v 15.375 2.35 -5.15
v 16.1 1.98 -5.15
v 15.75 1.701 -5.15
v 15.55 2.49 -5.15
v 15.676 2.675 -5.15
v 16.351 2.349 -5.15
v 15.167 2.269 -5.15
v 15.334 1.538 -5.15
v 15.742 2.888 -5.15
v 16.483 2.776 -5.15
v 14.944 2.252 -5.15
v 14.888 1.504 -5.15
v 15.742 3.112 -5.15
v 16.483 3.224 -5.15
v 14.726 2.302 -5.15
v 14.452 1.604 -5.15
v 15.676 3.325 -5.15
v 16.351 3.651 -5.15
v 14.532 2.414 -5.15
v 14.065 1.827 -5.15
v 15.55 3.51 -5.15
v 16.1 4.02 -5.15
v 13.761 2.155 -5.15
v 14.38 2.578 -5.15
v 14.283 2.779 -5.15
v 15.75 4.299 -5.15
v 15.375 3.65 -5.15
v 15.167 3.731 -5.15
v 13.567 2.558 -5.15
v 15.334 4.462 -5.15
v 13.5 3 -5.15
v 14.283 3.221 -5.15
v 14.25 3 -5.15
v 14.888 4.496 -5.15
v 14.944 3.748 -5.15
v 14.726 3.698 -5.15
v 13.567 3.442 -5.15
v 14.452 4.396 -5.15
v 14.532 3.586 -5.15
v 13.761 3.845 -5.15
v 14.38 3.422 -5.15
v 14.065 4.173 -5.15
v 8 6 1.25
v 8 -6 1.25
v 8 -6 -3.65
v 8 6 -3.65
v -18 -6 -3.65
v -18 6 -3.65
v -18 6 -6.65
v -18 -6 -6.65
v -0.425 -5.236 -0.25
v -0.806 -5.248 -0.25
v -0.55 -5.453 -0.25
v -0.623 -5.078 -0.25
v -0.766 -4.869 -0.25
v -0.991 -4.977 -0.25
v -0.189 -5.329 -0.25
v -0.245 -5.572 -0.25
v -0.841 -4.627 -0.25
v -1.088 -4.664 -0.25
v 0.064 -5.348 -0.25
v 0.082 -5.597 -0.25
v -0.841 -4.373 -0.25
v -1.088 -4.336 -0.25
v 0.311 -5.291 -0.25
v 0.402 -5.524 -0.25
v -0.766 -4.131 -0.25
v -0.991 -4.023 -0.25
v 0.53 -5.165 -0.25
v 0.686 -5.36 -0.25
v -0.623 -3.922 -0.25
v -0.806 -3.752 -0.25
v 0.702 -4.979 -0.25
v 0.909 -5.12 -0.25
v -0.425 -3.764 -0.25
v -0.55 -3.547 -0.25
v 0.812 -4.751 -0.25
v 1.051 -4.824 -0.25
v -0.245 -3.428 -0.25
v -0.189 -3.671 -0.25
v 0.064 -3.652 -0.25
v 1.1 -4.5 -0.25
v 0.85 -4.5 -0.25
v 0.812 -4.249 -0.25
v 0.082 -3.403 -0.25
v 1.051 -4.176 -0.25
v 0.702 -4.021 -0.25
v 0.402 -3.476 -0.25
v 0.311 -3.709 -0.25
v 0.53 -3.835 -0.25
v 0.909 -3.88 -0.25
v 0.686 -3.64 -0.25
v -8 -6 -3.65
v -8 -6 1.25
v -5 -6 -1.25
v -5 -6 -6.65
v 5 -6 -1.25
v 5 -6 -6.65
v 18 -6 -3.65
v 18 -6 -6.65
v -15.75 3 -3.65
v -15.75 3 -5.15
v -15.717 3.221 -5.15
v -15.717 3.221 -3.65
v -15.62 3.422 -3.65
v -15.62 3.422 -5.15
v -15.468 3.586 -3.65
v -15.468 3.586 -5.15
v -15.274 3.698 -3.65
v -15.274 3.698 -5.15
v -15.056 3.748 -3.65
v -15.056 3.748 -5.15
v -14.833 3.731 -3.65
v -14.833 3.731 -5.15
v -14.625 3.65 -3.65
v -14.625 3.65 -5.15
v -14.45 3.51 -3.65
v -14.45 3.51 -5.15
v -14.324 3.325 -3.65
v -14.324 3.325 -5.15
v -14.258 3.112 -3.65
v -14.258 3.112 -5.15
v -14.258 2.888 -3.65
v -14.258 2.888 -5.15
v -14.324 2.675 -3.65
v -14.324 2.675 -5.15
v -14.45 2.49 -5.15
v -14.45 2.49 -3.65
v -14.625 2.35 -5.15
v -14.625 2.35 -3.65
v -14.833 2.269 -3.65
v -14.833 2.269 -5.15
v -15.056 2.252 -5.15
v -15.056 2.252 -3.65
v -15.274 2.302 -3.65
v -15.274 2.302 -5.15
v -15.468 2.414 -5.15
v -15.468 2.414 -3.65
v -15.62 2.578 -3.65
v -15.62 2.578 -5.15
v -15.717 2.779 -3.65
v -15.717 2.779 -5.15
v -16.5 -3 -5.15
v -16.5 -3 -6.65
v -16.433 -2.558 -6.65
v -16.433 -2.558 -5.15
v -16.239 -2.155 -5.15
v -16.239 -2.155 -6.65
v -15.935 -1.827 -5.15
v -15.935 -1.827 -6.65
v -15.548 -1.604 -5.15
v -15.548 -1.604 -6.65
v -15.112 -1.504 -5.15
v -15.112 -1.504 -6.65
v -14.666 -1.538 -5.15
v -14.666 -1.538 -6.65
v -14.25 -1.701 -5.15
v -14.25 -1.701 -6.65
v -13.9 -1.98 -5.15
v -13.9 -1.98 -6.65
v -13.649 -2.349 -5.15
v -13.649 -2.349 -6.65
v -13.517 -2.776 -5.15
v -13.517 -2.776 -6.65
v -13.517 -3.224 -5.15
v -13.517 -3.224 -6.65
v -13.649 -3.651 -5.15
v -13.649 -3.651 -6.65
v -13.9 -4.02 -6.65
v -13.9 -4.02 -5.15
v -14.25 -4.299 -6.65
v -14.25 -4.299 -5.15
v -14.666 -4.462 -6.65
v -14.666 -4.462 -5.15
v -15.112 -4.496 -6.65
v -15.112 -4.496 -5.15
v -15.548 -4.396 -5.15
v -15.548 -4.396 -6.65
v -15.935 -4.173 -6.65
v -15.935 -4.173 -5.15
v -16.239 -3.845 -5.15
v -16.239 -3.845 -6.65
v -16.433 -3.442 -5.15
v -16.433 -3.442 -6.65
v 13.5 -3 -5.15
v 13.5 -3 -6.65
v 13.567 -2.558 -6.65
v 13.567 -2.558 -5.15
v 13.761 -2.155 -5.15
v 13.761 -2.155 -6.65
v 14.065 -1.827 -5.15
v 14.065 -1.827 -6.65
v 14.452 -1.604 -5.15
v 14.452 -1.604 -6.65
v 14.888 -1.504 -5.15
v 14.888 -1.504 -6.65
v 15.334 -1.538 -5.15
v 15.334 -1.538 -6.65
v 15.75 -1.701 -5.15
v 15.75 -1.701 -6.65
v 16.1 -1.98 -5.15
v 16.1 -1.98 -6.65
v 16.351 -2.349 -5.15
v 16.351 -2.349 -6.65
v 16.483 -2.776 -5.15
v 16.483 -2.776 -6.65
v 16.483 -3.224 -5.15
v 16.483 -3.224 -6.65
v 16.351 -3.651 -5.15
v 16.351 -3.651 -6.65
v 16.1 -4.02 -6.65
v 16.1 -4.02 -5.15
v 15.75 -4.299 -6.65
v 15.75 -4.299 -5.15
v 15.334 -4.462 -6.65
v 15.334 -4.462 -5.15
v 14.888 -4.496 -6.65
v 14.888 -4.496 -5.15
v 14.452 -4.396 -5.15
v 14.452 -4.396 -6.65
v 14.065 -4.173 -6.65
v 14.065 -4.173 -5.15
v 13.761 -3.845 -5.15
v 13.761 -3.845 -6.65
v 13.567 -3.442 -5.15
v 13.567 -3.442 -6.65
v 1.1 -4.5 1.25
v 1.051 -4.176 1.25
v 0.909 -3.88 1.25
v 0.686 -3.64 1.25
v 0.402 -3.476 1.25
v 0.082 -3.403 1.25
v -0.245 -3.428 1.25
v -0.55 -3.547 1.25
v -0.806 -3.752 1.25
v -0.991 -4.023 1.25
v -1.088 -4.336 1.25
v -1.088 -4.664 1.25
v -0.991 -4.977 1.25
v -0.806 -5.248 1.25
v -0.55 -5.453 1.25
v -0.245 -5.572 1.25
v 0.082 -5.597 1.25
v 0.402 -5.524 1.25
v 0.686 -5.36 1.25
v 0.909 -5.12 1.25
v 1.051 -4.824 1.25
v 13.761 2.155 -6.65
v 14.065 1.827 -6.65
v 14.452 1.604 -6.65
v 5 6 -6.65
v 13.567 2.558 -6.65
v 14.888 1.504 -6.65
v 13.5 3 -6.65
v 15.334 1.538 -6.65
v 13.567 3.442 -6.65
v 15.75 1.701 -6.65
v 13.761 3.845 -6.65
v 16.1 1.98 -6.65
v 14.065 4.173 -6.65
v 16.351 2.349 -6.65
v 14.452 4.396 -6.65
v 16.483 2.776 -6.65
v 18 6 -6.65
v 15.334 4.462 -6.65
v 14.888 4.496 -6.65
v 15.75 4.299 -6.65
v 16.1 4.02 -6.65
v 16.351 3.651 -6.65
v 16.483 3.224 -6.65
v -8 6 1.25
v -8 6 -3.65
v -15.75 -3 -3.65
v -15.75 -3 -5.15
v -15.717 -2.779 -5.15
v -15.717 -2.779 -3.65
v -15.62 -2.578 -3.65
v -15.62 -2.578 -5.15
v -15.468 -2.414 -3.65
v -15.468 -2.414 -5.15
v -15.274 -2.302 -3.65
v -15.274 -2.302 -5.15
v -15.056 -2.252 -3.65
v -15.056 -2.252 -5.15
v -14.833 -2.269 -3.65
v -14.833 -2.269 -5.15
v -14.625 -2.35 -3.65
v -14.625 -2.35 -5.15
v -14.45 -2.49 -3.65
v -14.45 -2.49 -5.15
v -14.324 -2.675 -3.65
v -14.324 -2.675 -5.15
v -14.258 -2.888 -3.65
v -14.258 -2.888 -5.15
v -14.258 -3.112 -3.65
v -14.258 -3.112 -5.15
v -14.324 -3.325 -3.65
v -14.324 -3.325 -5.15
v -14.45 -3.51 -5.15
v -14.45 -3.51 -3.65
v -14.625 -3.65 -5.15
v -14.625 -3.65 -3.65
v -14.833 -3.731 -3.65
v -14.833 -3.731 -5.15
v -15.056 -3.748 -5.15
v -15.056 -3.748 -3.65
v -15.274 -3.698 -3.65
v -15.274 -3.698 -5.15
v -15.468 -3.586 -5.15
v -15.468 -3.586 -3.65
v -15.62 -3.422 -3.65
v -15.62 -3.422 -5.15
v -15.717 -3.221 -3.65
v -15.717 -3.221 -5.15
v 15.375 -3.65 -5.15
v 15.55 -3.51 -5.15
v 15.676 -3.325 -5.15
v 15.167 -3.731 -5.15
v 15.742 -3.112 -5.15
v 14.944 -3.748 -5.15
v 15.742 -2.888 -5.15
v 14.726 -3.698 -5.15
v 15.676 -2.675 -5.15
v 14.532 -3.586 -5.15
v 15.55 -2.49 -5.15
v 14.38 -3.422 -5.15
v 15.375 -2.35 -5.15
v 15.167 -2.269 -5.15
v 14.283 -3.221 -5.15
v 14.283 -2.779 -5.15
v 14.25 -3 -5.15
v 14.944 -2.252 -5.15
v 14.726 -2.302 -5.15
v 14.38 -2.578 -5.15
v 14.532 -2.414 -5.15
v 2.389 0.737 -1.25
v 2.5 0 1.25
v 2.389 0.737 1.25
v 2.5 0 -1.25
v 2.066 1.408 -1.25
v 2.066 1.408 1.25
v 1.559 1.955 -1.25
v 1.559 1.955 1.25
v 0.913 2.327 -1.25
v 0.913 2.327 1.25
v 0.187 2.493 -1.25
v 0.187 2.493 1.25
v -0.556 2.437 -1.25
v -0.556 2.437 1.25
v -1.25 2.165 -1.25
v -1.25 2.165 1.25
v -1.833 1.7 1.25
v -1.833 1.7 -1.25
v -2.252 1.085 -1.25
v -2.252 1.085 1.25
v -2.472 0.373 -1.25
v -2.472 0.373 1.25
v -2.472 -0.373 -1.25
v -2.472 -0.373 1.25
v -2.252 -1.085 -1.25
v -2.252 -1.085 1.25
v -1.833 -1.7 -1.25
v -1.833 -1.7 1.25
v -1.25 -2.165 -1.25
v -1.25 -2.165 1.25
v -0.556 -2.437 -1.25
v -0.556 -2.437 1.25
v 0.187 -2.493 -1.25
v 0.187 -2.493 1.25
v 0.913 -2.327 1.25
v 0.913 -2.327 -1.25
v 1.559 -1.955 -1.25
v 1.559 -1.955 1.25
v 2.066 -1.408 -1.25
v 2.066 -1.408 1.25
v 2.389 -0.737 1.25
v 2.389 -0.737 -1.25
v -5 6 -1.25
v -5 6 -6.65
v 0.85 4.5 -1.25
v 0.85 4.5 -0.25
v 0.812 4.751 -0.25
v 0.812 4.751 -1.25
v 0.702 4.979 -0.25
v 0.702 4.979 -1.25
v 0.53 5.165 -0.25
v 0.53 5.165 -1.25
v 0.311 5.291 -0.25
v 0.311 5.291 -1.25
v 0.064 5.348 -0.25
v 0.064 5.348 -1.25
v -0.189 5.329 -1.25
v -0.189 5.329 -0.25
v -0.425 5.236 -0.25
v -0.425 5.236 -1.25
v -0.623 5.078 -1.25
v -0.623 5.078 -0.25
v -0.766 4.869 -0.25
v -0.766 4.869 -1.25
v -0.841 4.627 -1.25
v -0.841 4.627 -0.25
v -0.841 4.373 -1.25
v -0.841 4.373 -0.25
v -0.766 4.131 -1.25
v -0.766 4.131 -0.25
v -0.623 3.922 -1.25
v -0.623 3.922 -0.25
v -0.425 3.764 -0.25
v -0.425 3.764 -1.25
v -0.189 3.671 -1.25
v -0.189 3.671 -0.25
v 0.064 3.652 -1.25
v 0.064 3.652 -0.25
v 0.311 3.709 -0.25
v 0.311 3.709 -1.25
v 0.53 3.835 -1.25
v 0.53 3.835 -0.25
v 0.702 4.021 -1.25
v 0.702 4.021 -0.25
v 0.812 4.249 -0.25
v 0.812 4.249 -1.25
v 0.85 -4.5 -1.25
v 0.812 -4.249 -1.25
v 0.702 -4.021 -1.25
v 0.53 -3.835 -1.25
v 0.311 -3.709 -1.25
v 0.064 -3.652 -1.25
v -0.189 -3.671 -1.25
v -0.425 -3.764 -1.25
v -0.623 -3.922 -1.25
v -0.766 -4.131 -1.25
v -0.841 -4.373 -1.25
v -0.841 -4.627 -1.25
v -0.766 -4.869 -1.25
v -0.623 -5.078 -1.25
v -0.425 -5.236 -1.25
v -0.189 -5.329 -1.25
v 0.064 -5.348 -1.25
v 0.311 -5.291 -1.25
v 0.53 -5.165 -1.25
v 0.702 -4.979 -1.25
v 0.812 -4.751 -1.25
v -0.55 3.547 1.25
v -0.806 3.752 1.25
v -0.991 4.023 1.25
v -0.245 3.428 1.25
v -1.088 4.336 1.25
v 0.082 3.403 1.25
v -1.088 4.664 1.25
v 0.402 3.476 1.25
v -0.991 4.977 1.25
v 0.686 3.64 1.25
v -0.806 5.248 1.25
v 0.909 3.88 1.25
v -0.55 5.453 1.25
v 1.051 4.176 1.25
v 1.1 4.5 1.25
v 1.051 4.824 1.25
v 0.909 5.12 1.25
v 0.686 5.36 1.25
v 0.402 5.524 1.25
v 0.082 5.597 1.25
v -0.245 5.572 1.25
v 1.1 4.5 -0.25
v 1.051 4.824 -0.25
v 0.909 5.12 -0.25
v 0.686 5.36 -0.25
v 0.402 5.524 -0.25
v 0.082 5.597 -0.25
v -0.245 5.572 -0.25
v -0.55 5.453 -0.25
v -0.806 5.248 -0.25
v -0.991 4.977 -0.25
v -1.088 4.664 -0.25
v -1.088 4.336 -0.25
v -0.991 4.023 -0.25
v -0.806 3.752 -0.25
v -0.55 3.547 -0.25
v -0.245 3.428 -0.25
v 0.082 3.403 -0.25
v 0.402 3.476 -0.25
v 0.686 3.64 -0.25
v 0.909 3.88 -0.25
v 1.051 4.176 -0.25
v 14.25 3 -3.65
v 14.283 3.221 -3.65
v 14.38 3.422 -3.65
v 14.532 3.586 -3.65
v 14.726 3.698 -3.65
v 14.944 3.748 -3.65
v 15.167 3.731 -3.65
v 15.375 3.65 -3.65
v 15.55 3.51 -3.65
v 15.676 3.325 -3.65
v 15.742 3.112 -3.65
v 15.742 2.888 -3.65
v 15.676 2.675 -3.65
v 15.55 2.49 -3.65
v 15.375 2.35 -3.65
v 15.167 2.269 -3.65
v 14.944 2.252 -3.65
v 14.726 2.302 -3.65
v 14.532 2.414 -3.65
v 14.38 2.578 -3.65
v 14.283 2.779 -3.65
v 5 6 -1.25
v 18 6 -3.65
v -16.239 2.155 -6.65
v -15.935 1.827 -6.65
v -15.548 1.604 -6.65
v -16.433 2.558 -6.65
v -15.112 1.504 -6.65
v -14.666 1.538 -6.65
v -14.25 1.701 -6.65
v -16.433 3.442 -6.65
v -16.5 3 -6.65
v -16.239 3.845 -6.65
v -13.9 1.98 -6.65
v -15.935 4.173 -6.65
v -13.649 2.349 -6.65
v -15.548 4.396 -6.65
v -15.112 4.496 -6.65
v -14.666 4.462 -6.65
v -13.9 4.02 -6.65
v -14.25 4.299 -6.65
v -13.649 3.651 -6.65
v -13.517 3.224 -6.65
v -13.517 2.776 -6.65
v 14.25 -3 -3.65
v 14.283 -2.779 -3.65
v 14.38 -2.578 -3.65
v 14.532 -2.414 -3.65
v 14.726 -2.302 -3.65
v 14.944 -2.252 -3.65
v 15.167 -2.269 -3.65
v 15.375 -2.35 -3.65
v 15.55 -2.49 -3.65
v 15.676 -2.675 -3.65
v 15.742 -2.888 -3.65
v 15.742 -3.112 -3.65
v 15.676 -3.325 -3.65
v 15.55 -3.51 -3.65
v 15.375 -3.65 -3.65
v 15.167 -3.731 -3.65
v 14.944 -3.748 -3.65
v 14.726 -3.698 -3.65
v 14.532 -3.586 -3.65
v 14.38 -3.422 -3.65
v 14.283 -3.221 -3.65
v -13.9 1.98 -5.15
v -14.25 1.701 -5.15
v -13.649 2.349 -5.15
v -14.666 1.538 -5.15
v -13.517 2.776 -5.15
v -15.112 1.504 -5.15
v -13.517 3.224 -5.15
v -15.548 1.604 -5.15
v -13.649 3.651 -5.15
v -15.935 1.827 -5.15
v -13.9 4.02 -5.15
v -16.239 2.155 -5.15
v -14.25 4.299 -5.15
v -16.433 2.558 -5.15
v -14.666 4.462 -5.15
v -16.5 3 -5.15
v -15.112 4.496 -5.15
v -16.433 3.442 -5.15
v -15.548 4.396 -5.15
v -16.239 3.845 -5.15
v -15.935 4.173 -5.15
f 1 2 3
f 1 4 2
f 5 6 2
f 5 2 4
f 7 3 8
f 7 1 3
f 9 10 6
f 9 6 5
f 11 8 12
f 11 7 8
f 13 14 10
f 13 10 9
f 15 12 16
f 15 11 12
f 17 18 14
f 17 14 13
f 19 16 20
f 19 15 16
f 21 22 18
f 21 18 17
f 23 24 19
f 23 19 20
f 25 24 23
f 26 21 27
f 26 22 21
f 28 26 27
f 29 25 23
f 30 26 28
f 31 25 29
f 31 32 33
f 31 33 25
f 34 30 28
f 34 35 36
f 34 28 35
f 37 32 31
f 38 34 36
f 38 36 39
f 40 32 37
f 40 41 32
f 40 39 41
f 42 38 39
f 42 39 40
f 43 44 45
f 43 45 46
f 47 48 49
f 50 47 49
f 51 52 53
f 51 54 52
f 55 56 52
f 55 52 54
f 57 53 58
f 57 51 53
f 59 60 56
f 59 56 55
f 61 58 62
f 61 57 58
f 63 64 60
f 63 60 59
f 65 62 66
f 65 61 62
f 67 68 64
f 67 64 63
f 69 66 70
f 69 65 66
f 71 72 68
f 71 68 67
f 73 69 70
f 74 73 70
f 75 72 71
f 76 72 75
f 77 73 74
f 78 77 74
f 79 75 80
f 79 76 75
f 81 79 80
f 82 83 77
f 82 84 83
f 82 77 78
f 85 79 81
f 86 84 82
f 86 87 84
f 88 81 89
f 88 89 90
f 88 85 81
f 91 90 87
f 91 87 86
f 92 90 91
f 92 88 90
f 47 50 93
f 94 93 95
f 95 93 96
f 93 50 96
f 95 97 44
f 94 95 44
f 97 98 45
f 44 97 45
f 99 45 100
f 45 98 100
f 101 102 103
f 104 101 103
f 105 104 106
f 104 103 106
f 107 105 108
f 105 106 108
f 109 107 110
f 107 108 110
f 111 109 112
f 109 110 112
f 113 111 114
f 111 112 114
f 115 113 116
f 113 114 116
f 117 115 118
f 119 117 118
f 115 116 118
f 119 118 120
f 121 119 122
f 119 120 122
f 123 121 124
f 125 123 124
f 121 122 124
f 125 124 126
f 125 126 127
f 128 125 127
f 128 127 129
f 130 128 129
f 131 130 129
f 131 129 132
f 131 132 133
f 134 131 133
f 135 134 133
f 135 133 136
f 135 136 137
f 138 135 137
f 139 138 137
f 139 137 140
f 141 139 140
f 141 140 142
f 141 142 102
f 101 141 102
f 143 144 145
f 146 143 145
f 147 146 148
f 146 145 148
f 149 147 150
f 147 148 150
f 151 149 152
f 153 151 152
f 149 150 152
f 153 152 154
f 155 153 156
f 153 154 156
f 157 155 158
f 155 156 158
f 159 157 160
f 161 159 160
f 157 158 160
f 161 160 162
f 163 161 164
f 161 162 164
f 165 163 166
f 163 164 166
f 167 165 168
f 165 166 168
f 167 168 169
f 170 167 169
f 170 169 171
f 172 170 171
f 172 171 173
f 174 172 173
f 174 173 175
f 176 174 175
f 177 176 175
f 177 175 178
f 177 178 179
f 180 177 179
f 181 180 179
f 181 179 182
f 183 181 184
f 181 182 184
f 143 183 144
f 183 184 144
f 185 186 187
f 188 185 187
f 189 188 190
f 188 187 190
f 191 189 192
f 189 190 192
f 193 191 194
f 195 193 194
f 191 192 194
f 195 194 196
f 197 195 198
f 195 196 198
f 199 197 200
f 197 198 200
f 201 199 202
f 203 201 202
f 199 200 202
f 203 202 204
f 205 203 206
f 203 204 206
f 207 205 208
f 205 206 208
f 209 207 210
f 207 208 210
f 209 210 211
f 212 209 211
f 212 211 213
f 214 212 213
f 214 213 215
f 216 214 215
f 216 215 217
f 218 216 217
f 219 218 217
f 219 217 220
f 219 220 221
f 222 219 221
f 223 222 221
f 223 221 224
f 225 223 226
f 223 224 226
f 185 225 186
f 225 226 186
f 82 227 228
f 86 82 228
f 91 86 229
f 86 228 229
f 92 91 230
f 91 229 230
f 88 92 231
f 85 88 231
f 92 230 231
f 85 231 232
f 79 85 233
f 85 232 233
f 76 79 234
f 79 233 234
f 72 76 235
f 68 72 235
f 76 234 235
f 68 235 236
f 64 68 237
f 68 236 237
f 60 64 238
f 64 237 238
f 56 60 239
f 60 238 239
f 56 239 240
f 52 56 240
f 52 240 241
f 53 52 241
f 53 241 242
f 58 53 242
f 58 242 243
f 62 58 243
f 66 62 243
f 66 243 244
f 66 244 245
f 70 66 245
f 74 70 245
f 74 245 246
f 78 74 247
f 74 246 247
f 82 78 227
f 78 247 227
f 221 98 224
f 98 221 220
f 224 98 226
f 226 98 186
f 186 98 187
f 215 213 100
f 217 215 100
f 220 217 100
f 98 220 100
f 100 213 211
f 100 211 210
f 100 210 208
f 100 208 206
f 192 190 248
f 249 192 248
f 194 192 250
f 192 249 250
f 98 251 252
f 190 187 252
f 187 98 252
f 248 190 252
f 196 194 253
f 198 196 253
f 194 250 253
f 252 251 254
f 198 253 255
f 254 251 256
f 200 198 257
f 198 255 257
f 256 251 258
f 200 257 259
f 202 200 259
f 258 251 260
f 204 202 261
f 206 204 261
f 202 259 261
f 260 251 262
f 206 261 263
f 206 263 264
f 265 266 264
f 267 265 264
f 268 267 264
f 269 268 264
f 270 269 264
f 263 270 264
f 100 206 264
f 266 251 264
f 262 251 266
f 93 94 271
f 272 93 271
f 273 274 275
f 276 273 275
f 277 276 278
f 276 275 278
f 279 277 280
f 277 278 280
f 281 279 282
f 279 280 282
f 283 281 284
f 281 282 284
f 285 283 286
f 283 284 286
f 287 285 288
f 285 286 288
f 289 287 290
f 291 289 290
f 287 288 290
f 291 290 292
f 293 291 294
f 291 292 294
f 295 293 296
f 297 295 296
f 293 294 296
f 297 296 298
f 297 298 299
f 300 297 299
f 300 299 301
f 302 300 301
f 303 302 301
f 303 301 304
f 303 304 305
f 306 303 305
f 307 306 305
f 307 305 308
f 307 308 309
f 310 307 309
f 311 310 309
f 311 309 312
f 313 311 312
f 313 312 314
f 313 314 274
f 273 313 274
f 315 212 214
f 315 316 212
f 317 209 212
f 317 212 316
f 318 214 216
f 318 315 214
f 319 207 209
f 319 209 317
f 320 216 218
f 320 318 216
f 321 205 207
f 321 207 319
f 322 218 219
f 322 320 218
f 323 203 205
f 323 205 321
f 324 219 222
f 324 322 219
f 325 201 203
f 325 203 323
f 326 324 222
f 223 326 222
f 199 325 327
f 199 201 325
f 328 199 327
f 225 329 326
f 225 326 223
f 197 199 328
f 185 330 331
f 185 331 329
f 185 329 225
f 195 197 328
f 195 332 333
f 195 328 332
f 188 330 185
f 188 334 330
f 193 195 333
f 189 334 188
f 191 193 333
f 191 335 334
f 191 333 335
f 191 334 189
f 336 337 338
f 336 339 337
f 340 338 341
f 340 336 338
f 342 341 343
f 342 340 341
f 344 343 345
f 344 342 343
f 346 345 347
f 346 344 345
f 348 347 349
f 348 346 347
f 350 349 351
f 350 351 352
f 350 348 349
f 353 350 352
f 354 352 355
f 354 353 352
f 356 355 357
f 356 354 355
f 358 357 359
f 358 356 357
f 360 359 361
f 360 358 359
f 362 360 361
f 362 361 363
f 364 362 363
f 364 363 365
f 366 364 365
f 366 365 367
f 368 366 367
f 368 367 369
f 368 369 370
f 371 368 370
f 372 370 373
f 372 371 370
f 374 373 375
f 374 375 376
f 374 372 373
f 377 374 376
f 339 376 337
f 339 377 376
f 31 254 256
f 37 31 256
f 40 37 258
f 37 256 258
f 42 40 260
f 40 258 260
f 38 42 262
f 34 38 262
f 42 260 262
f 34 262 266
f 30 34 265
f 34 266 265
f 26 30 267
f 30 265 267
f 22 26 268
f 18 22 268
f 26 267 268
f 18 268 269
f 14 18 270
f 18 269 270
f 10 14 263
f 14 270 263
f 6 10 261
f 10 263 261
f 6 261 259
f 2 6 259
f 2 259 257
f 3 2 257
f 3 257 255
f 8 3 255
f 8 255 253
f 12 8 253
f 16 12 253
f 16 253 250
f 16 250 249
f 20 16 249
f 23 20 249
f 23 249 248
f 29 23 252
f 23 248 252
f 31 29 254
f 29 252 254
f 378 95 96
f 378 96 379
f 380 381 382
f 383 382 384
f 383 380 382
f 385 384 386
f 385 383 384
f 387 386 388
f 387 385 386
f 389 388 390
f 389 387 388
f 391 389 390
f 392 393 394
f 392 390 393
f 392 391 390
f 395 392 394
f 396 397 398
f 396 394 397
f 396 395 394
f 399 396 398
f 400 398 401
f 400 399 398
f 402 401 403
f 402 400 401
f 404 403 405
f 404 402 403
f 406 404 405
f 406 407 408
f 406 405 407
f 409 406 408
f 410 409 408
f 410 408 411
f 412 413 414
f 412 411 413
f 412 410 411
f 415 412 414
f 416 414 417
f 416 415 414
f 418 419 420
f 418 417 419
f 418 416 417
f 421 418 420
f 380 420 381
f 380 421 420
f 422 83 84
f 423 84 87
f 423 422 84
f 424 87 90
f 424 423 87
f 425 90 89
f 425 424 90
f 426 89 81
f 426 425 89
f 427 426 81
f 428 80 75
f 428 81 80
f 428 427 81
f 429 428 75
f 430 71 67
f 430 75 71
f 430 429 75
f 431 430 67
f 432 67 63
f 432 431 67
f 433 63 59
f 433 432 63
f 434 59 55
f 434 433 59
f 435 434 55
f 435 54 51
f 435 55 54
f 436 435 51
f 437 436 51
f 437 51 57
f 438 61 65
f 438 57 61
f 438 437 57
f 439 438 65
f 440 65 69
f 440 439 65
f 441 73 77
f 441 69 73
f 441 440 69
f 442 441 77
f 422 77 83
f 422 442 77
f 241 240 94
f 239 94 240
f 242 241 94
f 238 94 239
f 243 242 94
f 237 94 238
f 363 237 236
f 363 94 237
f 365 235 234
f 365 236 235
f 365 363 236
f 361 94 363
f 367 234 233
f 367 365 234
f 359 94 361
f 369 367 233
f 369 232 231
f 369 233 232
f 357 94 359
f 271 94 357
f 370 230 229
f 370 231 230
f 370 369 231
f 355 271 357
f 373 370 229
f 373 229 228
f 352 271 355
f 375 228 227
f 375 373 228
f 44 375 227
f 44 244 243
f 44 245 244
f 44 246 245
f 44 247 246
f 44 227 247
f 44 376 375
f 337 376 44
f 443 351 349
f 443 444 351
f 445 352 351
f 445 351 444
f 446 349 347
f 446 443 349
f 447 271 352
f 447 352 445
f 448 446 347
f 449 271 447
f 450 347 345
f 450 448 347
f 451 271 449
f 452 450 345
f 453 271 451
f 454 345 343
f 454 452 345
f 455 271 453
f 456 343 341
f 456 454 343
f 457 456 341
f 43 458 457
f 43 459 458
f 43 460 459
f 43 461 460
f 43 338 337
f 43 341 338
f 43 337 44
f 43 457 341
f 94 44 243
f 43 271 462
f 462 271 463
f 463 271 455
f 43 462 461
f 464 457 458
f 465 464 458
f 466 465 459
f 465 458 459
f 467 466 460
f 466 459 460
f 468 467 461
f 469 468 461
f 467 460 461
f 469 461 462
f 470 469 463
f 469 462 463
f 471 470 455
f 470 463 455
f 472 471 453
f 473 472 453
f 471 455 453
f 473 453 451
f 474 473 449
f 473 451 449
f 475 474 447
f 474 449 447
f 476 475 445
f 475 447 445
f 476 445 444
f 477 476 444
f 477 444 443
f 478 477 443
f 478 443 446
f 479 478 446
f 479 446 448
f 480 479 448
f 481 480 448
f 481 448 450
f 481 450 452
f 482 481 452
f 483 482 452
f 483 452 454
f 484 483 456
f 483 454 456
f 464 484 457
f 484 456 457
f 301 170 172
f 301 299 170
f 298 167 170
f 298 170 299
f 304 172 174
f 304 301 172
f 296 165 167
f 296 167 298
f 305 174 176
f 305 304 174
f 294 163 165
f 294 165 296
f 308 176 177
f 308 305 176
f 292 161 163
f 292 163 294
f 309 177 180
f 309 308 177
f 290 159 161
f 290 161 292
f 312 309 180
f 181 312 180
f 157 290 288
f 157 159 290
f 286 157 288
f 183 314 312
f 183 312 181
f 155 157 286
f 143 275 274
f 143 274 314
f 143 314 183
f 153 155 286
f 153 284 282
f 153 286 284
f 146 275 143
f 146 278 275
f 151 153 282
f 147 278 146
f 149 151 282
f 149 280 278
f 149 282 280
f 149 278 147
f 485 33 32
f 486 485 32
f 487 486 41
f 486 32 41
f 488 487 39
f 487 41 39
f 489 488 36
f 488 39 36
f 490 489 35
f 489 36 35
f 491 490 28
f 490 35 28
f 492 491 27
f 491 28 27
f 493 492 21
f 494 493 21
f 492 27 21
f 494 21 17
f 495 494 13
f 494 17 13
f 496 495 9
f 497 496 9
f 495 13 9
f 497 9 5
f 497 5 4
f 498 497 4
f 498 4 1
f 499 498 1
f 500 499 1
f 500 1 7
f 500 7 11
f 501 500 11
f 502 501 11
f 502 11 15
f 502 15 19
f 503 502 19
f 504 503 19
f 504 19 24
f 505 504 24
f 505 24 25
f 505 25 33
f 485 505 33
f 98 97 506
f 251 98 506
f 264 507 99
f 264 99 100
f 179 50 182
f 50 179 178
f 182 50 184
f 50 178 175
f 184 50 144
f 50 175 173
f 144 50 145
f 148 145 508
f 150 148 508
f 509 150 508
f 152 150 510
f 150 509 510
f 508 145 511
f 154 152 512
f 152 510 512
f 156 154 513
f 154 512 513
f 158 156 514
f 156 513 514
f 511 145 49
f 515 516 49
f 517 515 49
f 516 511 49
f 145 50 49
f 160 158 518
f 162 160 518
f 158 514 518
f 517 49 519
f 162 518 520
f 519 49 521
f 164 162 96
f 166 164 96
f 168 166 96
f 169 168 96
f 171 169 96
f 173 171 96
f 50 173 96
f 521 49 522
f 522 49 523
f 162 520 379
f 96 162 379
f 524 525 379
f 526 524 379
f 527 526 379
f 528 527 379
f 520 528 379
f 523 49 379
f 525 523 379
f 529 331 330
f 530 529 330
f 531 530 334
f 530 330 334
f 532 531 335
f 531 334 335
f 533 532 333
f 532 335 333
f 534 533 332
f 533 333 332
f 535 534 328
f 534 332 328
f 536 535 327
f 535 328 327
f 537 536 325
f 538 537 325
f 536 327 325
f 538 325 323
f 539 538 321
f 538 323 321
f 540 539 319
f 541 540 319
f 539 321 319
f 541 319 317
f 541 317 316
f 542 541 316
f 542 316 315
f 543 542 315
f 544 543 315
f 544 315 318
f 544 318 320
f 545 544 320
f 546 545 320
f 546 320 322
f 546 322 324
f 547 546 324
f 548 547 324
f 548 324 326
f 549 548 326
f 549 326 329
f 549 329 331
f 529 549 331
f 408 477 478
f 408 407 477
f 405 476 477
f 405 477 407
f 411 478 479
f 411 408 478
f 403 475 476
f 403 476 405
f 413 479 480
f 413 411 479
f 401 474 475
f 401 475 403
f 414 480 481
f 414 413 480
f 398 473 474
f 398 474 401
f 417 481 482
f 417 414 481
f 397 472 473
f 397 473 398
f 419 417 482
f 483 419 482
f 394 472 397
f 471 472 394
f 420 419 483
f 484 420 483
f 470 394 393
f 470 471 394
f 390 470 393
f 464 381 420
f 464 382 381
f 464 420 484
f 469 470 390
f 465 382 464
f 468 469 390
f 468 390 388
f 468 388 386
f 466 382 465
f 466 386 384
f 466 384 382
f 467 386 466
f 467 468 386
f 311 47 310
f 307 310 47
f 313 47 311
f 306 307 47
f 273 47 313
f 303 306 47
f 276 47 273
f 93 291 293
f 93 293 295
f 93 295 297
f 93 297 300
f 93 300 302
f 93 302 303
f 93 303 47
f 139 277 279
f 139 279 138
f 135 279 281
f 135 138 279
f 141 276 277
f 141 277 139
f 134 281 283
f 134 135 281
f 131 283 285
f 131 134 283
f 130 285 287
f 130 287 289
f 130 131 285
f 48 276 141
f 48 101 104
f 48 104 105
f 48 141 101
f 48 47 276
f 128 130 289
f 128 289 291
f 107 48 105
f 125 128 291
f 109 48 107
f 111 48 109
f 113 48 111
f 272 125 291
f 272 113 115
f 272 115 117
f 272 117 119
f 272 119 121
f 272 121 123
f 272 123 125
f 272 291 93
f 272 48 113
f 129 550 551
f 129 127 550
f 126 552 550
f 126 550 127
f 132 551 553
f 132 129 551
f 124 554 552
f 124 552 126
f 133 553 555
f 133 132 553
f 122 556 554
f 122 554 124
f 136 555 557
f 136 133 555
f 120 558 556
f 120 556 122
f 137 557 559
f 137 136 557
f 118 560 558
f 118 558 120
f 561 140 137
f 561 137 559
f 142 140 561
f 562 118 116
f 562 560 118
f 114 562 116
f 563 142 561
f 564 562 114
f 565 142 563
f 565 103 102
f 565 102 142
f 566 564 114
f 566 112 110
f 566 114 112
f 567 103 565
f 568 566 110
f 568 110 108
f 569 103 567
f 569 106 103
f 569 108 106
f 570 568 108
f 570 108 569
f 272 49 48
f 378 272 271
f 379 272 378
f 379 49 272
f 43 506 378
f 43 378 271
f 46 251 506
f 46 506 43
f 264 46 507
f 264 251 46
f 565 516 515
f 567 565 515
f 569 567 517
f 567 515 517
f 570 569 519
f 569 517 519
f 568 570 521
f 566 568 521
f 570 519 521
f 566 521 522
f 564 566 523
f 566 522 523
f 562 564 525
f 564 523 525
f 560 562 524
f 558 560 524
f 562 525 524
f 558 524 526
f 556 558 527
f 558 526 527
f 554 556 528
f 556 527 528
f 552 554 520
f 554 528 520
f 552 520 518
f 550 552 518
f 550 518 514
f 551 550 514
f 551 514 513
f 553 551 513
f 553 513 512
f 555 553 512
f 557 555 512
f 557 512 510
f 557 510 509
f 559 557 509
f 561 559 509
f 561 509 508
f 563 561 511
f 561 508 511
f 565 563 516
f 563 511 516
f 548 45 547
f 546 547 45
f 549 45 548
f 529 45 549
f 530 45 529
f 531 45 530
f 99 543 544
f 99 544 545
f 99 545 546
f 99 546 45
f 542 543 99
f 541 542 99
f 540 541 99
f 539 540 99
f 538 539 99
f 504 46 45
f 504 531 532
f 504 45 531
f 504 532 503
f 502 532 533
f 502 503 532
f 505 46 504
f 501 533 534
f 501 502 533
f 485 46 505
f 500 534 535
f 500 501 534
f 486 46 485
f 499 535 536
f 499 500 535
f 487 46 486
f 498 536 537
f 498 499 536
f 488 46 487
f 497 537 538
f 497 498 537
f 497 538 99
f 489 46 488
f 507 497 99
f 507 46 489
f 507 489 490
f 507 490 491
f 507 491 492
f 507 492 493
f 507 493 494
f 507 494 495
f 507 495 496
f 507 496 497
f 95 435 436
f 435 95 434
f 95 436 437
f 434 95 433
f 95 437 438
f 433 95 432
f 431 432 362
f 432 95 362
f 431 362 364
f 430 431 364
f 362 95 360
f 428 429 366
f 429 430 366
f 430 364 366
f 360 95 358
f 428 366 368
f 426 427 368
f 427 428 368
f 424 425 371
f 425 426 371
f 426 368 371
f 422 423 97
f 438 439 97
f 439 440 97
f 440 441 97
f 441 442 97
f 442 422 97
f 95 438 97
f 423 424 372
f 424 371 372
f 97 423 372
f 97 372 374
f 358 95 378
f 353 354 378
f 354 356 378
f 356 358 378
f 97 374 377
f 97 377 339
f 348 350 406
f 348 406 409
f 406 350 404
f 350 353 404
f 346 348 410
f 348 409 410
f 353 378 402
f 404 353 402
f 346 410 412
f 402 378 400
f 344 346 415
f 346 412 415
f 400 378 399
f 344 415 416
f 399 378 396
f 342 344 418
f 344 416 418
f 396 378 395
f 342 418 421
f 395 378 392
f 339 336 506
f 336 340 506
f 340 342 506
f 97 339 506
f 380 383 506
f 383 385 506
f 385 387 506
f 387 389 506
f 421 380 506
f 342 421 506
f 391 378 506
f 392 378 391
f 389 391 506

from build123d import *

# Parameters (mm, degrees)
SKETCH_1_W          = 10
SKETCH_1_H          = 12
SKETCH_1_R          = 0.85
SKETCH_1_R_2        = 2.5
EXTRUDE_1_DEPTH     = 1.25
CUT_EXTRUDE_START   = 1.25
SKETCH_1_6_R        = 1.1
CUT_EXTRUDE_1_DEPTH = 1.5
SKETCH_2_W          = 3
SKETCH_2_H          = 12
EXTRUDE_2_DEPTH     = 7.9
SKETCH_3_W          = 10
SKETCH_3_H          = 3
EXTRUDE_3_DEPTH     = 12
SKETCH_4_R          = 0.75
CUT_EXTRUDE_2_DEPTH = 21.552615405
SKETCH_4_3_R        = 1.5
CUT_EXTRUDE_3_DEPTH = 1.5


with BuildPart() as part:
    # 草图1 → 凸台-拉伸1 (new, symmetric)
    with BuildSketch(Plane.XY):
        Rectangle(SKETCH_1_W, SKETCH_1_H)
        with Locations((0, 4.5)):
            Circle(SKETCH_1_R, mode=Mode.SUBTRACT)
        with Locations((0, -4.5)):
            Circle(SKETCH_1_R, mode=Mode.SUBTRACT)
        Circle(SKETCH_1_R_2, mode=Mode.SUBTRACT)
    extrude(amount=EXTRUDE_1_DEPTH, both=True)

    # 草图1<6> → 切除-拉伸1 (cut)
    with BuildSketch(Plane.XY.offset(CUT_EXTRUDE_START)):
        with Locations((0, 4.5)):
            Circle(SKETCH_1_6_R)
        with Locations((0, -4.5)):
            Circle(SKETCH_1_6_R)
    extrude(amount=-CUT_EXTRUDE_1_DEPTH, mode=Mode.SUBTRACT)

    # 草图2 → 凸台-拉伸2 (add)
    with BuildSketch(Plane.XY.offset(1.25)):
        with Locations((6.5, 0)):
            Rectangle(SKETCH_2_W, SKETCH_2_H)
        with Locations((-6.5, 0)):
            Rectangle(SKETCH_2_W, SKETCH_2_H)
    extrude(amount=-EXTRUDE_2_DEPTH)

    # 草图3 → 凸台-拉伸3 (add)
    with BuildSketch(Plane(origin=(0, 6, 0), x_dir=(1, 0, 0), z_dir=(0, 1, 0))):
        with Locations((-13, 5.15)):
            Rectangle(SKETCH_3_W, SKETCH_3_H)
        with Locations((13, 5.15)):
            Rectangle(SKETCH_3_W, SKETCH_3_H)
    extrude(amount=-EXTRUDE_3_DEPTH)

    # 草图4 → 切除-拉伸2 (cut, through all)
    with BuildSketch(Plane(origin=(0, 0, -6.65), x_dir=(-1, 0, 0), z_dir=(0, 0, -1))):
        with Locations((15, -3)):
            Circle(SKETCH_4_R)
        with Locations((15, 3)):
            Circle(SKETCH_4_R)
        with Locations((-15, -3)):
            Circle(SKETCH_4_R)
        with Locations((-15, 3)):
            Circle(SKETCH_4_R)
    extrude(amount=-CUT_EXTRUDE_2_DEPTH, mode=Mode.SUBTRACT)

    # 草图4<3> → 切除-拉伸3 (cut)
    with BuildSketch(Plane(origin=(0, 0, -6.65), x_dir=(-1, 0, 0), z_dir=(0, 0, -1))):
        with Locations((15, 3)):
            Circle(SKETCH_4_3_R)
        with Locations((15, -3)):
            Circle(SKETCH_4_3_R)
        with Locations((-15, 3)):
            Circle(SKETCH_4_3_R)
        with Locations((-15, -3)):
            Circle(SKETCH_4_3_R)
    extrude(amount=-CUT_EXTRUDE_3_DEPTH, mode=Mode.SUBTRACT)


solid = part.part
